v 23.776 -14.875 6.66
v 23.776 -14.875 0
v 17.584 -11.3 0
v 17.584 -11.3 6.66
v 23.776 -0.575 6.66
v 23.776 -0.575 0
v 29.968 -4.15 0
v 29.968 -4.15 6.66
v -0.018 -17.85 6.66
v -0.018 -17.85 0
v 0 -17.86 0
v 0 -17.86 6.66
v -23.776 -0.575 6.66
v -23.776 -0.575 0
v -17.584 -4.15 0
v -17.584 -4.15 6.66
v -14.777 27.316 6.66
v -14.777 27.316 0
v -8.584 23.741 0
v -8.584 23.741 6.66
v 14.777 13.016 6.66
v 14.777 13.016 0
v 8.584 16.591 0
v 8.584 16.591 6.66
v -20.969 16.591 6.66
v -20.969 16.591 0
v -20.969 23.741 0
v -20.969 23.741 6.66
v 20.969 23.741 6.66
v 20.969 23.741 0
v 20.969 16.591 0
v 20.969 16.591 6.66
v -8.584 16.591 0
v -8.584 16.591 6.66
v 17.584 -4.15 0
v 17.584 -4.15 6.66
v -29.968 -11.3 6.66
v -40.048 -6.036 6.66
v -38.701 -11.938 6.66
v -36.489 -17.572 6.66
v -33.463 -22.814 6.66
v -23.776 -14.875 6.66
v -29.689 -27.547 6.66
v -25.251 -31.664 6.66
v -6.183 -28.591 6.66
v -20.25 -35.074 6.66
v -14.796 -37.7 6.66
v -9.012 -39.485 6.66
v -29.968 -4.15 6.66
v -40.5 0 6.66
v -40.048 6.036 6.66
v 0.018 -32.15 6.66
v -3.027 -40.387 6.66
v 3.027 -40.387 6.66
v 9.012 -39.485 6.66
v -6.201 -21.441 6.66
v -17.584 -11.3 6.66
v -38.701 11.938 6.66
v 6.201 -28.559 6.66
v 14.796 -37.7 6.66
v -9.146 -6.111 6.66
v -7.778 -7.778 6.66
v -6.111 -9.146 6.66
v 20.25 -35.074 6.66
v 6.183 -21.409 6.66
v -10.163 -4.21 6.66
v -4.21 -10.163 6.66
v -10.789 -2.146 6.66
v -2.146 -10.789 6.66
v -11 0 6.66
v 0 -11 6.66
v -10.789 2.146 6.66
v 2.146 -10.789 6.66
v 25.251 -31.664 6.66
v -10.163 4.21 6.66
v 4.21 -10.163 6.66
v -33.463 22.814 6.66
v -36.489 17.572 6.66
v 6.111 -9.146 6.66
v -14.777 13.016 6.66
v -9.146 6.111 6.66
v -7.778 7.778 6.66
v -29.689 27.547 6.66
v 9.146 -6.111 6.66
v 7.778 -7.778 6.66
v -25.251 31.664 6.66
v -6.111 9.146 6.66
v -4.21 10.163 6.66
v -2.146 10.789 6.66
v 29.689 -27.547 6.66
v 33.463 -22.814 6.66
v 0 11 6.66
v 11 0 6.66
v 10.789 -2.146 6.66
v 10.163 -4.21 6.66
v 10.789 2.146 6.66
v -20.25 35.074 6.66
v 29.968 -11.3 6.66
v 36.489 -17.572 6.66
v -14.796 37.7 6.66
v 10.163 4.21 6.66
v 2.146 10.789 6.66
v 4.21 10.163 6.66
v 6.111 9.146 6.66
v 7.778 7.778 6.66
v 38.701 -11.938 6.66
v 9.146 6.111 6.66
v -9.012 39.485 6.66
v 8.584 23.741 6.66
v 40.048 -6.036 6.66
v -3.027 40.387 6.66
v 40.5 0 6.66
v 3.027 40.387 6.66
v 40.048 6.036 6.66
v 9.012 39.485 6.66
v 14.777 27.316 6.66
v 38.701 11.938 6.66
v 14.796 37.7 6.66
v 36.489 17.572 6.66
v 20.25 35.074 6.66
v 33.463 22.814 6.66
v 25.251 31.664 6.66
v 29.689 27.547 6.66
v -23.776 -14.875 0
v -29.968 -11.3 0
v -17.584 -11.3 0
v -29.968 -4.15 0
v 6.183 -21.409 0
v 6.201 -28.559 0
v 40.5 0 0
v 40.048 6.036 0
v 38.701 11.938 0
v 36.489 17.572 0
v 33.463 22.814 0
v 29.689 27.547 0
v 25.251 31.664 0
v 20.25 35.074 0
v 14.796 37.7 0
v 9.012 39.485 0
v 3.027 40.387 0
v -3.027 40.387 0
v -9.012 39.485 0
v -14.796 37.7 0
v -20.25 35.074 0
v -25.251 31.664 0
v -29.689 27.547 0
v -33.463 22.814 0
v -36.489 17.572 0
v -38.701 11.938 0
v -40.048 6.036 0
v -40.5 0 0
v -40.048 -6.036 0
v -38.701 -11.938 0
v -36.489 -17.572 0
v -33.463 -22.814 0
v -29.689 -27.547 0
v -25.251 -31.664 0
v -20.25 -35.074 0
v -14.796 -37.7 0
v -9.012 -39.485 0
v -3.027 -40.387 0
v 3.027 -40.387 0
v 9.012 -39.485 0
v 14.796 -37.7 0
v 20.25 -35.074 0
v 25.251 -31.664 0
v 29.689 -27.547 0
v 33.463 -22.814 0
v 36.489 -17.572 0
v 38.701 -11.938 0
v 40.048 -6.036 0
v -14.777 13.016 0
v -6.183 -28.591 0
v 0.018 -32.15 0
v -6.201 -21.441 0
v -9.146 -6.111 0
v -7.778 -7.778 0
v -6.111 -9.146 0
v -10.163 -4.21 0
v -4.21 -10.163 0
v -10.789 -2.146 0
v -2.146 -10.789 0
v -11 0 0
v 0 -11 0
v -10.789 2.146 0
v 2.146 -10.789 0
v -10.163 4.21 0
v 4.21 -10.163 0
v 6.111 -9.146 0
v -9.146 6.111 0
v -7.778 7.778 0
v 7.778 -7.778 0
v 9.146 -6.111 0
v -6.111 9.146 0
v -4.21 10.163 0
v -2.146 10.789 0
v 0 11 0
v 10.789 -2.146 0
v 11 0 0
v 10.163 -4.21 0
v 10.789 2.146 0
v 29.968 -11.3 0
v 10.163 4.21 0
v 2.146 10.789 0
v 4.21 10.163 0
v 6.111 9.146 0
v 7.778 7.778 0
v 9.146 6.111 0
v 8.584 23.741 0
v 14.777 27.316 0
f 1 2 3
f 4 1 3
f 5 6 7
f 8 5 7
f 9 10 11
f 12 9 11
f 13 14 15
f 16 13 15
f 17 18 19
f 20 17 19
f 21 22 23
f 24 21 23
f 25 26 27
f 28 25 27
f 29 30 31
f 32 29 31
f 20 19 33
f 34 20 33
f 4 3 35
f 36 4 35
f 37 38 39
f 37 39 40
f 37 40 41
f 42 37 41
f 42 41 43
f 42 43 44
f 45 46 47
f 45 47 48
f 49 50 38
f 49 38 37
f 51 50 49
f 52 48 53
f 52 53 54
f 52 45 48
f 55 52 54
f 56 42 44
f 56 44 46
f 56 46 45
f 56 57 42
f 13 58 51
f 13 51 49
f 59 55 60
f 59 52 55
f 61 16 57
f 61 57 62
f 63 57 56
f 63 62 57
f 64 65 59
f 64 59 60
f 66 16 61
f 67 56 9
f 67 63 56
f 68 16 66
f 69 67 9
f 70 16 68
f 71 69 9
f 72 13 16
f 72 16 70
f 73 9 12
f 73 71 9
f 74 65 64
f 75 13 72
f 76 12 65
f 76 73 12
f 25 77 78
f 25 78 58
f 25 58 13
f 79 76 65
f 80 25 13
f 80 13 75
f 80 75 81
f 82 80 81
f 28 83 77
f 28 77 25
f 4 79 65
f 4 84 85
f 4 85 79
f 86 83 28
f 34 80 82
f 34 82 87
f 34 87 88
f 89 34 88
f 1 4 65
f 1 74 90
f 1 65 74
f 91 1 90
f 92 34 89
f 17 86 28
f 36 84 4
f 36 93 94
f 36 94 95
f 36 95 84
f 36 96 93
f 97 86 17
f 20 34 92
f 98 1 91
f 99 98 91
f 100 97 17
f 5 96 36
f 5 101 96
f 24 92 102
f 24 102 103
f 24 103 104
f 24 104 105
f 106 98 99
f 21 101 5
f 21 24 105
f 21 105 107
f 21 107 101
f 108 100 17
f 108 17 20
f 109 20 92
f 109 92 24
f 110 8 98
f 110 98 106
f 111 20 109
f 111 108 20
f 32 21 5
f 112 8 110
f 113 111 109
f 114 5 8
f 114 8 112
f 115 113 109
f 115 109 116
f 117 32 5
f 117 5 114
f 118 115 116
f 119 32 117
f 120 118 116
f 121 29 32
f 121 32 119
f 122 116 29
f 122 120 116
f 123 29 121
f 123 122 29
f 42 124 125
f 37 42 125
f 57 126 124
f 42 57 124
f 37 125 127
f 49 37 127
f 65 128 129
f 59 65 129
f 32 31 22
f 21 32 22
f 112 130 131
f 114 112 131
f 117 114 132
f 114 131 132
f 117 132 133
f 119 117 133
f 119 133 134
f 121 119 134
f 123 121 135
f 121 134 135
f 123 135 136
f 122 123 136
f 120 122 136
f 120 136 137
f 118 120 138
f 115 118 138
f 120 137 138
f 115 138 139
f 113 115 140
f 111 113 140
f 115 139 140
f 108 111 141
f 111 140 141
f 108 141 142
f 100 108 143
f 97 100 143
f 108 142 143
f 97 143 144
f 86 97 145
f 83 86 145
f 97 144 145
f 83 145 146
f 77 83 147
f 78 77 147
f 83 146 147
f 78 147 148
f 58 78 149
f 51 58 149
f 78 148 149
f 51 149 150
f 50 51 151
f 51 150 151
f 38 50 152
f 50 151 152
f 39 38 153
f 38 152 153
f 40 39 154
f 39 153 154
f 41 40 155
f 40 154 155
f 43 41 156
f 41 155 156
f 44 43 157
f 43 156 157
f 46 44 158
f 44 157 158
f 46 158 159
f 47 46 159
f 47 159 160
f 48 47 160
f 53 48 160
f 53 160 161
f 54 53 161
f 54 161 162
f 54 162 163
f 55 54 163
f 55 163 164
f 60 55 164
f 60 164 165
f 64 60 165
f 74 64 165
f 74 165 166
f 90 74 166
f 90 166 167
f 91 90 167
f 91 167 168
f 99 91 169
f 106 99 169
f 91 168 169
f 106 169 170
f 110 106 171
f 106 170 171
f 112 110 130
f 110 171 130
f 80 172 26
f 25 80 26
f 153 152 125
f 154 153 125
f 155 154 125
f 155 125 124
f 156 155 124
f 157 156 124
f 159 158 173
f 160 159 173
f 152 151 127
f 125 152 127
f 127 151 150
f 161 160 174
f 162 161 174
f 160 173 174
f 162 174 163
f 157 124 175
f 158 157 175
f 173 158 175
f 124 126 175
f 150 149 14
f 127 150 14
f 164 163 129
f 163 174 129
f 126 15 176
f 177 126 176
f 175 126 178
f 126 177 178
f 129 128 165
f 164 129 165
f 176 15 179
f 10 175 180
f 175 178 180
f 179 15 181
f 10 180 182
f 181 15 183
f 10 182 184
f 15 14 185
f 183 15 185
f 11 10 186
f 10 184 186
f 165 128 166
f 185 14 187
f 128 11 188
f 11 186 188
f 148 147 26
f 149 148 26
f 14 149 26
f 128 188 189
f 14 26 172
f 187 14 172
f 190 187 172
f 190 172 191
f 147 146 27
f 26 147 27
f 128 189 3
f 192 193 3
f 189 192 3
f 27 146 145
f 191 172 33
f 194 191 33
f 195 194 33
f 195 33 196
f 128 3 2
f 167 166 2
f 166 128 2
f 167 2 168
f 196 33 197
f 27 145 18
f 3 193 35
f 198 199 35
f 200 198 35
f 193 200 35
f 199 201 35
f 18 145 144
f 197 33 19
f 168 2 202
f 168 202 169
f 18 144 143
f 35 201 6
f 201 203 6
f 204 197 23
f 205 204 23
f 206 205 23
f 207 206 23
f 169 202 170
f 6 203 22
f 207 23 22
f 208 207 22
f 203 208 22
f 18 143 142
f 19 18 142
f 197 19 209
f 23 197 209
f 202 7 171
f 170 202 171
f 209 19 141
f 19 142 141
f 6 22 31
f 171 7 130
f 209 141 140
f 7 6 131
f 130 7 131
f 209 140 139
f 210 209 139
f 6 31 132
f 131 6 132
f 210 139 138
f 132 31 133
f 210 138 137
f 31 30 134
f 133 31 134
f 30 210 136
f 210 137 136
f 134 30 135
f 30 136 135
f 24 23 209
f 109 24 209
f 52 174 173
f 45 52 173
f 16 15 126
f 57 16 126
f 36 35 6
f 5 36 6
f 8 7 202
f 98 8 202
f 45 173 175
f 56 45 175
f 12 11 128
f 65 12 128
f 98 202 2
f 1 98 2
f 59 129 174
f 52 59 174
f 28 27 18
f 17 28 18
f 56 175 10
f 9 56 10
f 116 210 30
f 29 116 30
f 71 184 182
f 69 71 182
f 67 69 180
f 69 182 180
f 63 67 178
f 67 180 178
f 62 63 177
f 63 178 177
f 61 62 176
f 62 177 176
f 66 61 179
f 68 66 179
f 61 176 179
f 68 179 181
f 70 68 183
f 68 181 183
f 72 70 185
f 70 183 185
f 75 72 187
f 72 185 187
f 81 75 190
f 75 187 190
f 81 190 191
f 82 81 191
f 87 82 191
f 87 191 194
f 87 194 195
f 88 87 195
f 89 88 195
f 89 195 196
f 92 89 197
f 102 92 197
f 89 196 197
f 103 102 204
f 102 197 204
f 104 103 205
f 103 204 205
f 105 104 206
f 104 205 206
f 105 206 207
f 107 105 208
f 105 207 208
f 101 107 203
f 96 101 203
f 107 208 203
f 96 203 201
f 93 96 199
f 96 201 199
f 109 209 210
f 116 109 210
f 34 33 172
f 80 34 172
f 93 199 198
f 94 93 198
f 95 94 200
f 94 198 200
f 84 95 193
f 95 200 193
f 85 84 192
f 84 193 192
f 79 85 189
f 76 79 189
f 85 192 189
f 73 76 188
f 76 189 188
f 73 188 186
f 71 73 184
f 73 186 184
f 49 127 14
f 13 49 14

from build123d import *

# Parameters (mm, degrees)
F0_R     = 40.5
F1_DEPTH = 6.66


# Not quite as in the source:
# - a feature names something its author has since deleted; it is built from what else it names


with BuildPart() as f1:
    # F0 (on Top) → F1 (new body)
    with BuildSketch(Plane.XY):
        Circle(F0_R)
        Polygon((-23.7764129074, -14.8754248594), (-29.9684945444, -11.3004248594), (-29.9684945444, -4.1504248594), (-23.7764129074, -0.5754248594), (-17.5843312703, -4.1504248594), (-17.5843312703, -11.3004248594), align=None, mode=Mode.SUBTRACT)
        Polygon((-0.0180177662, -17.8500227021), (0, -17.8603648131), (6.1830530933, -21.4094075078), (6.2010708595, -28.5593848057), (0.0180177662, -32.1499772979), (-6.1830530933, -28.5905924922), (-6.2010708595, -21.4406151943), align=None, mode=Mode.SUBTRACT)
        Polygon((23.7764129074, -0.5754248594), (29.9684945444, -4.1504248594), (29.9684945444, -11.3004248594), (23.7764129074, -14.8754248594), (17.5843312703, -11.3004248594), (17.5843312703, -4.1504248594), align=None, mode=Mode.SUBTRACT)
        Polygon((-14.7765176587, 27.3156769259), (-8.5844360217, 23.7406769259), (-8.5844360217, 16.5906769259), (-14.7765176587, 13.0156769259), (-20.9685992958, 16.5906769259), (-20.9685992958, 23.7406769259), align=None, mode=Mode.SUBTRACT)
        with BuildLine():
            ThreePointArc((0, -11), (-7.7781745931, 7.7781745931), (11, 0))
            ThreePointArc((11, 0), (7.7781745931, -7.7781745931), (0, -11))
        make_face(mode=Mode.SUBTRACT)
        Polygon((14.7765176587, 27.3156769259), (20.9685992958, 23.7406769259), (20.9685992958, 16.5906769259), (14.7765176587, 13.0156769259), (8.5844360217, 16.5906769259), (8.5844360217, 23.7406769259), align=None, mode=Mode.SUBTRACT)
    extrude(amount=F1_DEPTH)


solid = f1.part
